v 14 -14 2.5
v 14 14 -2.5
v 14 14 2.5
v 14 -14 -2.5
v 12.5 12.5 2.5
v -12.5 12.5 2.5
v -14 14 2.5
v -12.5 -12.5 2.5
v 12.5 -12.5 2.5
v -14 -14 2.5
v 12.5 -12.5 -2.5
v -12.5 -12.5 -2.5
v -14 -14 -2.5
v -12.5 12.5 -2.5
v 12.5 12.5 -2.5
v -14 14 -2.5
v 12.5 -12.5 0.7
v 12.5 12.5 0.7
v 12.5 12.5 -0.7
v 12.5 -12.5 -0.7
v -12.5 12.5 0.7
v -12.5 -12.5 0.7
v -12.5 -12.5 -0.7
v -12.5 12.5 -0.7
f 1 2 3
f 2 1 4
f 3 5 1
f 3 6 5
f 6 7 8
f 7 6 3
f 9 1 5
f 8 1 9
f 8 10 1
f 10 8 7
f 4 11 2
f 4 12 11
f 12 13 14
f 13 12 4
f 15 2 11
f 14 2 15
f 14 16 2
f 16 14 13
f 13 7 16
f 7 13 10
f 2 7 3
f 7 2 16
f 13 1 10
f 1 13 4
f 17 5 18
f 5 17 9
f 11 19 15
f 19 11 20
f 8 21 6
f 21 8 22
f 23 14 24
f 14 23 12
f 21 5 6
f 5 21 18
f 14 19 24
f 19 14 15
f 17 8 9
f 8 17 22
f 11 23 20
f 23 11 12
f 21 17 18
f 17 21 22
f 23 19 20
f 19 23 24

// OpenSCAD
//Size of the actual cube
Size = 25; 		    //[3:100]
//Border thickness
BorderThicc = 1.5;  //[0.5:0.1:10]
//Border Height     
BorderHigh = 5;     //[2:0.1:10]
//Bottom thickness
Bottom = 1.4;       //[0.5:0.1:10]

//Fixed Resolution
$fa=5+0;
$fs=0.5+0;

//Actual code
difference(){
    cube([Size+BorderThicc*2,Size+BorderThicc*2,BorderHigh], true);
    cube([Size,Size,Size], true);
}
cube([Size,Size,Bottom], true);
